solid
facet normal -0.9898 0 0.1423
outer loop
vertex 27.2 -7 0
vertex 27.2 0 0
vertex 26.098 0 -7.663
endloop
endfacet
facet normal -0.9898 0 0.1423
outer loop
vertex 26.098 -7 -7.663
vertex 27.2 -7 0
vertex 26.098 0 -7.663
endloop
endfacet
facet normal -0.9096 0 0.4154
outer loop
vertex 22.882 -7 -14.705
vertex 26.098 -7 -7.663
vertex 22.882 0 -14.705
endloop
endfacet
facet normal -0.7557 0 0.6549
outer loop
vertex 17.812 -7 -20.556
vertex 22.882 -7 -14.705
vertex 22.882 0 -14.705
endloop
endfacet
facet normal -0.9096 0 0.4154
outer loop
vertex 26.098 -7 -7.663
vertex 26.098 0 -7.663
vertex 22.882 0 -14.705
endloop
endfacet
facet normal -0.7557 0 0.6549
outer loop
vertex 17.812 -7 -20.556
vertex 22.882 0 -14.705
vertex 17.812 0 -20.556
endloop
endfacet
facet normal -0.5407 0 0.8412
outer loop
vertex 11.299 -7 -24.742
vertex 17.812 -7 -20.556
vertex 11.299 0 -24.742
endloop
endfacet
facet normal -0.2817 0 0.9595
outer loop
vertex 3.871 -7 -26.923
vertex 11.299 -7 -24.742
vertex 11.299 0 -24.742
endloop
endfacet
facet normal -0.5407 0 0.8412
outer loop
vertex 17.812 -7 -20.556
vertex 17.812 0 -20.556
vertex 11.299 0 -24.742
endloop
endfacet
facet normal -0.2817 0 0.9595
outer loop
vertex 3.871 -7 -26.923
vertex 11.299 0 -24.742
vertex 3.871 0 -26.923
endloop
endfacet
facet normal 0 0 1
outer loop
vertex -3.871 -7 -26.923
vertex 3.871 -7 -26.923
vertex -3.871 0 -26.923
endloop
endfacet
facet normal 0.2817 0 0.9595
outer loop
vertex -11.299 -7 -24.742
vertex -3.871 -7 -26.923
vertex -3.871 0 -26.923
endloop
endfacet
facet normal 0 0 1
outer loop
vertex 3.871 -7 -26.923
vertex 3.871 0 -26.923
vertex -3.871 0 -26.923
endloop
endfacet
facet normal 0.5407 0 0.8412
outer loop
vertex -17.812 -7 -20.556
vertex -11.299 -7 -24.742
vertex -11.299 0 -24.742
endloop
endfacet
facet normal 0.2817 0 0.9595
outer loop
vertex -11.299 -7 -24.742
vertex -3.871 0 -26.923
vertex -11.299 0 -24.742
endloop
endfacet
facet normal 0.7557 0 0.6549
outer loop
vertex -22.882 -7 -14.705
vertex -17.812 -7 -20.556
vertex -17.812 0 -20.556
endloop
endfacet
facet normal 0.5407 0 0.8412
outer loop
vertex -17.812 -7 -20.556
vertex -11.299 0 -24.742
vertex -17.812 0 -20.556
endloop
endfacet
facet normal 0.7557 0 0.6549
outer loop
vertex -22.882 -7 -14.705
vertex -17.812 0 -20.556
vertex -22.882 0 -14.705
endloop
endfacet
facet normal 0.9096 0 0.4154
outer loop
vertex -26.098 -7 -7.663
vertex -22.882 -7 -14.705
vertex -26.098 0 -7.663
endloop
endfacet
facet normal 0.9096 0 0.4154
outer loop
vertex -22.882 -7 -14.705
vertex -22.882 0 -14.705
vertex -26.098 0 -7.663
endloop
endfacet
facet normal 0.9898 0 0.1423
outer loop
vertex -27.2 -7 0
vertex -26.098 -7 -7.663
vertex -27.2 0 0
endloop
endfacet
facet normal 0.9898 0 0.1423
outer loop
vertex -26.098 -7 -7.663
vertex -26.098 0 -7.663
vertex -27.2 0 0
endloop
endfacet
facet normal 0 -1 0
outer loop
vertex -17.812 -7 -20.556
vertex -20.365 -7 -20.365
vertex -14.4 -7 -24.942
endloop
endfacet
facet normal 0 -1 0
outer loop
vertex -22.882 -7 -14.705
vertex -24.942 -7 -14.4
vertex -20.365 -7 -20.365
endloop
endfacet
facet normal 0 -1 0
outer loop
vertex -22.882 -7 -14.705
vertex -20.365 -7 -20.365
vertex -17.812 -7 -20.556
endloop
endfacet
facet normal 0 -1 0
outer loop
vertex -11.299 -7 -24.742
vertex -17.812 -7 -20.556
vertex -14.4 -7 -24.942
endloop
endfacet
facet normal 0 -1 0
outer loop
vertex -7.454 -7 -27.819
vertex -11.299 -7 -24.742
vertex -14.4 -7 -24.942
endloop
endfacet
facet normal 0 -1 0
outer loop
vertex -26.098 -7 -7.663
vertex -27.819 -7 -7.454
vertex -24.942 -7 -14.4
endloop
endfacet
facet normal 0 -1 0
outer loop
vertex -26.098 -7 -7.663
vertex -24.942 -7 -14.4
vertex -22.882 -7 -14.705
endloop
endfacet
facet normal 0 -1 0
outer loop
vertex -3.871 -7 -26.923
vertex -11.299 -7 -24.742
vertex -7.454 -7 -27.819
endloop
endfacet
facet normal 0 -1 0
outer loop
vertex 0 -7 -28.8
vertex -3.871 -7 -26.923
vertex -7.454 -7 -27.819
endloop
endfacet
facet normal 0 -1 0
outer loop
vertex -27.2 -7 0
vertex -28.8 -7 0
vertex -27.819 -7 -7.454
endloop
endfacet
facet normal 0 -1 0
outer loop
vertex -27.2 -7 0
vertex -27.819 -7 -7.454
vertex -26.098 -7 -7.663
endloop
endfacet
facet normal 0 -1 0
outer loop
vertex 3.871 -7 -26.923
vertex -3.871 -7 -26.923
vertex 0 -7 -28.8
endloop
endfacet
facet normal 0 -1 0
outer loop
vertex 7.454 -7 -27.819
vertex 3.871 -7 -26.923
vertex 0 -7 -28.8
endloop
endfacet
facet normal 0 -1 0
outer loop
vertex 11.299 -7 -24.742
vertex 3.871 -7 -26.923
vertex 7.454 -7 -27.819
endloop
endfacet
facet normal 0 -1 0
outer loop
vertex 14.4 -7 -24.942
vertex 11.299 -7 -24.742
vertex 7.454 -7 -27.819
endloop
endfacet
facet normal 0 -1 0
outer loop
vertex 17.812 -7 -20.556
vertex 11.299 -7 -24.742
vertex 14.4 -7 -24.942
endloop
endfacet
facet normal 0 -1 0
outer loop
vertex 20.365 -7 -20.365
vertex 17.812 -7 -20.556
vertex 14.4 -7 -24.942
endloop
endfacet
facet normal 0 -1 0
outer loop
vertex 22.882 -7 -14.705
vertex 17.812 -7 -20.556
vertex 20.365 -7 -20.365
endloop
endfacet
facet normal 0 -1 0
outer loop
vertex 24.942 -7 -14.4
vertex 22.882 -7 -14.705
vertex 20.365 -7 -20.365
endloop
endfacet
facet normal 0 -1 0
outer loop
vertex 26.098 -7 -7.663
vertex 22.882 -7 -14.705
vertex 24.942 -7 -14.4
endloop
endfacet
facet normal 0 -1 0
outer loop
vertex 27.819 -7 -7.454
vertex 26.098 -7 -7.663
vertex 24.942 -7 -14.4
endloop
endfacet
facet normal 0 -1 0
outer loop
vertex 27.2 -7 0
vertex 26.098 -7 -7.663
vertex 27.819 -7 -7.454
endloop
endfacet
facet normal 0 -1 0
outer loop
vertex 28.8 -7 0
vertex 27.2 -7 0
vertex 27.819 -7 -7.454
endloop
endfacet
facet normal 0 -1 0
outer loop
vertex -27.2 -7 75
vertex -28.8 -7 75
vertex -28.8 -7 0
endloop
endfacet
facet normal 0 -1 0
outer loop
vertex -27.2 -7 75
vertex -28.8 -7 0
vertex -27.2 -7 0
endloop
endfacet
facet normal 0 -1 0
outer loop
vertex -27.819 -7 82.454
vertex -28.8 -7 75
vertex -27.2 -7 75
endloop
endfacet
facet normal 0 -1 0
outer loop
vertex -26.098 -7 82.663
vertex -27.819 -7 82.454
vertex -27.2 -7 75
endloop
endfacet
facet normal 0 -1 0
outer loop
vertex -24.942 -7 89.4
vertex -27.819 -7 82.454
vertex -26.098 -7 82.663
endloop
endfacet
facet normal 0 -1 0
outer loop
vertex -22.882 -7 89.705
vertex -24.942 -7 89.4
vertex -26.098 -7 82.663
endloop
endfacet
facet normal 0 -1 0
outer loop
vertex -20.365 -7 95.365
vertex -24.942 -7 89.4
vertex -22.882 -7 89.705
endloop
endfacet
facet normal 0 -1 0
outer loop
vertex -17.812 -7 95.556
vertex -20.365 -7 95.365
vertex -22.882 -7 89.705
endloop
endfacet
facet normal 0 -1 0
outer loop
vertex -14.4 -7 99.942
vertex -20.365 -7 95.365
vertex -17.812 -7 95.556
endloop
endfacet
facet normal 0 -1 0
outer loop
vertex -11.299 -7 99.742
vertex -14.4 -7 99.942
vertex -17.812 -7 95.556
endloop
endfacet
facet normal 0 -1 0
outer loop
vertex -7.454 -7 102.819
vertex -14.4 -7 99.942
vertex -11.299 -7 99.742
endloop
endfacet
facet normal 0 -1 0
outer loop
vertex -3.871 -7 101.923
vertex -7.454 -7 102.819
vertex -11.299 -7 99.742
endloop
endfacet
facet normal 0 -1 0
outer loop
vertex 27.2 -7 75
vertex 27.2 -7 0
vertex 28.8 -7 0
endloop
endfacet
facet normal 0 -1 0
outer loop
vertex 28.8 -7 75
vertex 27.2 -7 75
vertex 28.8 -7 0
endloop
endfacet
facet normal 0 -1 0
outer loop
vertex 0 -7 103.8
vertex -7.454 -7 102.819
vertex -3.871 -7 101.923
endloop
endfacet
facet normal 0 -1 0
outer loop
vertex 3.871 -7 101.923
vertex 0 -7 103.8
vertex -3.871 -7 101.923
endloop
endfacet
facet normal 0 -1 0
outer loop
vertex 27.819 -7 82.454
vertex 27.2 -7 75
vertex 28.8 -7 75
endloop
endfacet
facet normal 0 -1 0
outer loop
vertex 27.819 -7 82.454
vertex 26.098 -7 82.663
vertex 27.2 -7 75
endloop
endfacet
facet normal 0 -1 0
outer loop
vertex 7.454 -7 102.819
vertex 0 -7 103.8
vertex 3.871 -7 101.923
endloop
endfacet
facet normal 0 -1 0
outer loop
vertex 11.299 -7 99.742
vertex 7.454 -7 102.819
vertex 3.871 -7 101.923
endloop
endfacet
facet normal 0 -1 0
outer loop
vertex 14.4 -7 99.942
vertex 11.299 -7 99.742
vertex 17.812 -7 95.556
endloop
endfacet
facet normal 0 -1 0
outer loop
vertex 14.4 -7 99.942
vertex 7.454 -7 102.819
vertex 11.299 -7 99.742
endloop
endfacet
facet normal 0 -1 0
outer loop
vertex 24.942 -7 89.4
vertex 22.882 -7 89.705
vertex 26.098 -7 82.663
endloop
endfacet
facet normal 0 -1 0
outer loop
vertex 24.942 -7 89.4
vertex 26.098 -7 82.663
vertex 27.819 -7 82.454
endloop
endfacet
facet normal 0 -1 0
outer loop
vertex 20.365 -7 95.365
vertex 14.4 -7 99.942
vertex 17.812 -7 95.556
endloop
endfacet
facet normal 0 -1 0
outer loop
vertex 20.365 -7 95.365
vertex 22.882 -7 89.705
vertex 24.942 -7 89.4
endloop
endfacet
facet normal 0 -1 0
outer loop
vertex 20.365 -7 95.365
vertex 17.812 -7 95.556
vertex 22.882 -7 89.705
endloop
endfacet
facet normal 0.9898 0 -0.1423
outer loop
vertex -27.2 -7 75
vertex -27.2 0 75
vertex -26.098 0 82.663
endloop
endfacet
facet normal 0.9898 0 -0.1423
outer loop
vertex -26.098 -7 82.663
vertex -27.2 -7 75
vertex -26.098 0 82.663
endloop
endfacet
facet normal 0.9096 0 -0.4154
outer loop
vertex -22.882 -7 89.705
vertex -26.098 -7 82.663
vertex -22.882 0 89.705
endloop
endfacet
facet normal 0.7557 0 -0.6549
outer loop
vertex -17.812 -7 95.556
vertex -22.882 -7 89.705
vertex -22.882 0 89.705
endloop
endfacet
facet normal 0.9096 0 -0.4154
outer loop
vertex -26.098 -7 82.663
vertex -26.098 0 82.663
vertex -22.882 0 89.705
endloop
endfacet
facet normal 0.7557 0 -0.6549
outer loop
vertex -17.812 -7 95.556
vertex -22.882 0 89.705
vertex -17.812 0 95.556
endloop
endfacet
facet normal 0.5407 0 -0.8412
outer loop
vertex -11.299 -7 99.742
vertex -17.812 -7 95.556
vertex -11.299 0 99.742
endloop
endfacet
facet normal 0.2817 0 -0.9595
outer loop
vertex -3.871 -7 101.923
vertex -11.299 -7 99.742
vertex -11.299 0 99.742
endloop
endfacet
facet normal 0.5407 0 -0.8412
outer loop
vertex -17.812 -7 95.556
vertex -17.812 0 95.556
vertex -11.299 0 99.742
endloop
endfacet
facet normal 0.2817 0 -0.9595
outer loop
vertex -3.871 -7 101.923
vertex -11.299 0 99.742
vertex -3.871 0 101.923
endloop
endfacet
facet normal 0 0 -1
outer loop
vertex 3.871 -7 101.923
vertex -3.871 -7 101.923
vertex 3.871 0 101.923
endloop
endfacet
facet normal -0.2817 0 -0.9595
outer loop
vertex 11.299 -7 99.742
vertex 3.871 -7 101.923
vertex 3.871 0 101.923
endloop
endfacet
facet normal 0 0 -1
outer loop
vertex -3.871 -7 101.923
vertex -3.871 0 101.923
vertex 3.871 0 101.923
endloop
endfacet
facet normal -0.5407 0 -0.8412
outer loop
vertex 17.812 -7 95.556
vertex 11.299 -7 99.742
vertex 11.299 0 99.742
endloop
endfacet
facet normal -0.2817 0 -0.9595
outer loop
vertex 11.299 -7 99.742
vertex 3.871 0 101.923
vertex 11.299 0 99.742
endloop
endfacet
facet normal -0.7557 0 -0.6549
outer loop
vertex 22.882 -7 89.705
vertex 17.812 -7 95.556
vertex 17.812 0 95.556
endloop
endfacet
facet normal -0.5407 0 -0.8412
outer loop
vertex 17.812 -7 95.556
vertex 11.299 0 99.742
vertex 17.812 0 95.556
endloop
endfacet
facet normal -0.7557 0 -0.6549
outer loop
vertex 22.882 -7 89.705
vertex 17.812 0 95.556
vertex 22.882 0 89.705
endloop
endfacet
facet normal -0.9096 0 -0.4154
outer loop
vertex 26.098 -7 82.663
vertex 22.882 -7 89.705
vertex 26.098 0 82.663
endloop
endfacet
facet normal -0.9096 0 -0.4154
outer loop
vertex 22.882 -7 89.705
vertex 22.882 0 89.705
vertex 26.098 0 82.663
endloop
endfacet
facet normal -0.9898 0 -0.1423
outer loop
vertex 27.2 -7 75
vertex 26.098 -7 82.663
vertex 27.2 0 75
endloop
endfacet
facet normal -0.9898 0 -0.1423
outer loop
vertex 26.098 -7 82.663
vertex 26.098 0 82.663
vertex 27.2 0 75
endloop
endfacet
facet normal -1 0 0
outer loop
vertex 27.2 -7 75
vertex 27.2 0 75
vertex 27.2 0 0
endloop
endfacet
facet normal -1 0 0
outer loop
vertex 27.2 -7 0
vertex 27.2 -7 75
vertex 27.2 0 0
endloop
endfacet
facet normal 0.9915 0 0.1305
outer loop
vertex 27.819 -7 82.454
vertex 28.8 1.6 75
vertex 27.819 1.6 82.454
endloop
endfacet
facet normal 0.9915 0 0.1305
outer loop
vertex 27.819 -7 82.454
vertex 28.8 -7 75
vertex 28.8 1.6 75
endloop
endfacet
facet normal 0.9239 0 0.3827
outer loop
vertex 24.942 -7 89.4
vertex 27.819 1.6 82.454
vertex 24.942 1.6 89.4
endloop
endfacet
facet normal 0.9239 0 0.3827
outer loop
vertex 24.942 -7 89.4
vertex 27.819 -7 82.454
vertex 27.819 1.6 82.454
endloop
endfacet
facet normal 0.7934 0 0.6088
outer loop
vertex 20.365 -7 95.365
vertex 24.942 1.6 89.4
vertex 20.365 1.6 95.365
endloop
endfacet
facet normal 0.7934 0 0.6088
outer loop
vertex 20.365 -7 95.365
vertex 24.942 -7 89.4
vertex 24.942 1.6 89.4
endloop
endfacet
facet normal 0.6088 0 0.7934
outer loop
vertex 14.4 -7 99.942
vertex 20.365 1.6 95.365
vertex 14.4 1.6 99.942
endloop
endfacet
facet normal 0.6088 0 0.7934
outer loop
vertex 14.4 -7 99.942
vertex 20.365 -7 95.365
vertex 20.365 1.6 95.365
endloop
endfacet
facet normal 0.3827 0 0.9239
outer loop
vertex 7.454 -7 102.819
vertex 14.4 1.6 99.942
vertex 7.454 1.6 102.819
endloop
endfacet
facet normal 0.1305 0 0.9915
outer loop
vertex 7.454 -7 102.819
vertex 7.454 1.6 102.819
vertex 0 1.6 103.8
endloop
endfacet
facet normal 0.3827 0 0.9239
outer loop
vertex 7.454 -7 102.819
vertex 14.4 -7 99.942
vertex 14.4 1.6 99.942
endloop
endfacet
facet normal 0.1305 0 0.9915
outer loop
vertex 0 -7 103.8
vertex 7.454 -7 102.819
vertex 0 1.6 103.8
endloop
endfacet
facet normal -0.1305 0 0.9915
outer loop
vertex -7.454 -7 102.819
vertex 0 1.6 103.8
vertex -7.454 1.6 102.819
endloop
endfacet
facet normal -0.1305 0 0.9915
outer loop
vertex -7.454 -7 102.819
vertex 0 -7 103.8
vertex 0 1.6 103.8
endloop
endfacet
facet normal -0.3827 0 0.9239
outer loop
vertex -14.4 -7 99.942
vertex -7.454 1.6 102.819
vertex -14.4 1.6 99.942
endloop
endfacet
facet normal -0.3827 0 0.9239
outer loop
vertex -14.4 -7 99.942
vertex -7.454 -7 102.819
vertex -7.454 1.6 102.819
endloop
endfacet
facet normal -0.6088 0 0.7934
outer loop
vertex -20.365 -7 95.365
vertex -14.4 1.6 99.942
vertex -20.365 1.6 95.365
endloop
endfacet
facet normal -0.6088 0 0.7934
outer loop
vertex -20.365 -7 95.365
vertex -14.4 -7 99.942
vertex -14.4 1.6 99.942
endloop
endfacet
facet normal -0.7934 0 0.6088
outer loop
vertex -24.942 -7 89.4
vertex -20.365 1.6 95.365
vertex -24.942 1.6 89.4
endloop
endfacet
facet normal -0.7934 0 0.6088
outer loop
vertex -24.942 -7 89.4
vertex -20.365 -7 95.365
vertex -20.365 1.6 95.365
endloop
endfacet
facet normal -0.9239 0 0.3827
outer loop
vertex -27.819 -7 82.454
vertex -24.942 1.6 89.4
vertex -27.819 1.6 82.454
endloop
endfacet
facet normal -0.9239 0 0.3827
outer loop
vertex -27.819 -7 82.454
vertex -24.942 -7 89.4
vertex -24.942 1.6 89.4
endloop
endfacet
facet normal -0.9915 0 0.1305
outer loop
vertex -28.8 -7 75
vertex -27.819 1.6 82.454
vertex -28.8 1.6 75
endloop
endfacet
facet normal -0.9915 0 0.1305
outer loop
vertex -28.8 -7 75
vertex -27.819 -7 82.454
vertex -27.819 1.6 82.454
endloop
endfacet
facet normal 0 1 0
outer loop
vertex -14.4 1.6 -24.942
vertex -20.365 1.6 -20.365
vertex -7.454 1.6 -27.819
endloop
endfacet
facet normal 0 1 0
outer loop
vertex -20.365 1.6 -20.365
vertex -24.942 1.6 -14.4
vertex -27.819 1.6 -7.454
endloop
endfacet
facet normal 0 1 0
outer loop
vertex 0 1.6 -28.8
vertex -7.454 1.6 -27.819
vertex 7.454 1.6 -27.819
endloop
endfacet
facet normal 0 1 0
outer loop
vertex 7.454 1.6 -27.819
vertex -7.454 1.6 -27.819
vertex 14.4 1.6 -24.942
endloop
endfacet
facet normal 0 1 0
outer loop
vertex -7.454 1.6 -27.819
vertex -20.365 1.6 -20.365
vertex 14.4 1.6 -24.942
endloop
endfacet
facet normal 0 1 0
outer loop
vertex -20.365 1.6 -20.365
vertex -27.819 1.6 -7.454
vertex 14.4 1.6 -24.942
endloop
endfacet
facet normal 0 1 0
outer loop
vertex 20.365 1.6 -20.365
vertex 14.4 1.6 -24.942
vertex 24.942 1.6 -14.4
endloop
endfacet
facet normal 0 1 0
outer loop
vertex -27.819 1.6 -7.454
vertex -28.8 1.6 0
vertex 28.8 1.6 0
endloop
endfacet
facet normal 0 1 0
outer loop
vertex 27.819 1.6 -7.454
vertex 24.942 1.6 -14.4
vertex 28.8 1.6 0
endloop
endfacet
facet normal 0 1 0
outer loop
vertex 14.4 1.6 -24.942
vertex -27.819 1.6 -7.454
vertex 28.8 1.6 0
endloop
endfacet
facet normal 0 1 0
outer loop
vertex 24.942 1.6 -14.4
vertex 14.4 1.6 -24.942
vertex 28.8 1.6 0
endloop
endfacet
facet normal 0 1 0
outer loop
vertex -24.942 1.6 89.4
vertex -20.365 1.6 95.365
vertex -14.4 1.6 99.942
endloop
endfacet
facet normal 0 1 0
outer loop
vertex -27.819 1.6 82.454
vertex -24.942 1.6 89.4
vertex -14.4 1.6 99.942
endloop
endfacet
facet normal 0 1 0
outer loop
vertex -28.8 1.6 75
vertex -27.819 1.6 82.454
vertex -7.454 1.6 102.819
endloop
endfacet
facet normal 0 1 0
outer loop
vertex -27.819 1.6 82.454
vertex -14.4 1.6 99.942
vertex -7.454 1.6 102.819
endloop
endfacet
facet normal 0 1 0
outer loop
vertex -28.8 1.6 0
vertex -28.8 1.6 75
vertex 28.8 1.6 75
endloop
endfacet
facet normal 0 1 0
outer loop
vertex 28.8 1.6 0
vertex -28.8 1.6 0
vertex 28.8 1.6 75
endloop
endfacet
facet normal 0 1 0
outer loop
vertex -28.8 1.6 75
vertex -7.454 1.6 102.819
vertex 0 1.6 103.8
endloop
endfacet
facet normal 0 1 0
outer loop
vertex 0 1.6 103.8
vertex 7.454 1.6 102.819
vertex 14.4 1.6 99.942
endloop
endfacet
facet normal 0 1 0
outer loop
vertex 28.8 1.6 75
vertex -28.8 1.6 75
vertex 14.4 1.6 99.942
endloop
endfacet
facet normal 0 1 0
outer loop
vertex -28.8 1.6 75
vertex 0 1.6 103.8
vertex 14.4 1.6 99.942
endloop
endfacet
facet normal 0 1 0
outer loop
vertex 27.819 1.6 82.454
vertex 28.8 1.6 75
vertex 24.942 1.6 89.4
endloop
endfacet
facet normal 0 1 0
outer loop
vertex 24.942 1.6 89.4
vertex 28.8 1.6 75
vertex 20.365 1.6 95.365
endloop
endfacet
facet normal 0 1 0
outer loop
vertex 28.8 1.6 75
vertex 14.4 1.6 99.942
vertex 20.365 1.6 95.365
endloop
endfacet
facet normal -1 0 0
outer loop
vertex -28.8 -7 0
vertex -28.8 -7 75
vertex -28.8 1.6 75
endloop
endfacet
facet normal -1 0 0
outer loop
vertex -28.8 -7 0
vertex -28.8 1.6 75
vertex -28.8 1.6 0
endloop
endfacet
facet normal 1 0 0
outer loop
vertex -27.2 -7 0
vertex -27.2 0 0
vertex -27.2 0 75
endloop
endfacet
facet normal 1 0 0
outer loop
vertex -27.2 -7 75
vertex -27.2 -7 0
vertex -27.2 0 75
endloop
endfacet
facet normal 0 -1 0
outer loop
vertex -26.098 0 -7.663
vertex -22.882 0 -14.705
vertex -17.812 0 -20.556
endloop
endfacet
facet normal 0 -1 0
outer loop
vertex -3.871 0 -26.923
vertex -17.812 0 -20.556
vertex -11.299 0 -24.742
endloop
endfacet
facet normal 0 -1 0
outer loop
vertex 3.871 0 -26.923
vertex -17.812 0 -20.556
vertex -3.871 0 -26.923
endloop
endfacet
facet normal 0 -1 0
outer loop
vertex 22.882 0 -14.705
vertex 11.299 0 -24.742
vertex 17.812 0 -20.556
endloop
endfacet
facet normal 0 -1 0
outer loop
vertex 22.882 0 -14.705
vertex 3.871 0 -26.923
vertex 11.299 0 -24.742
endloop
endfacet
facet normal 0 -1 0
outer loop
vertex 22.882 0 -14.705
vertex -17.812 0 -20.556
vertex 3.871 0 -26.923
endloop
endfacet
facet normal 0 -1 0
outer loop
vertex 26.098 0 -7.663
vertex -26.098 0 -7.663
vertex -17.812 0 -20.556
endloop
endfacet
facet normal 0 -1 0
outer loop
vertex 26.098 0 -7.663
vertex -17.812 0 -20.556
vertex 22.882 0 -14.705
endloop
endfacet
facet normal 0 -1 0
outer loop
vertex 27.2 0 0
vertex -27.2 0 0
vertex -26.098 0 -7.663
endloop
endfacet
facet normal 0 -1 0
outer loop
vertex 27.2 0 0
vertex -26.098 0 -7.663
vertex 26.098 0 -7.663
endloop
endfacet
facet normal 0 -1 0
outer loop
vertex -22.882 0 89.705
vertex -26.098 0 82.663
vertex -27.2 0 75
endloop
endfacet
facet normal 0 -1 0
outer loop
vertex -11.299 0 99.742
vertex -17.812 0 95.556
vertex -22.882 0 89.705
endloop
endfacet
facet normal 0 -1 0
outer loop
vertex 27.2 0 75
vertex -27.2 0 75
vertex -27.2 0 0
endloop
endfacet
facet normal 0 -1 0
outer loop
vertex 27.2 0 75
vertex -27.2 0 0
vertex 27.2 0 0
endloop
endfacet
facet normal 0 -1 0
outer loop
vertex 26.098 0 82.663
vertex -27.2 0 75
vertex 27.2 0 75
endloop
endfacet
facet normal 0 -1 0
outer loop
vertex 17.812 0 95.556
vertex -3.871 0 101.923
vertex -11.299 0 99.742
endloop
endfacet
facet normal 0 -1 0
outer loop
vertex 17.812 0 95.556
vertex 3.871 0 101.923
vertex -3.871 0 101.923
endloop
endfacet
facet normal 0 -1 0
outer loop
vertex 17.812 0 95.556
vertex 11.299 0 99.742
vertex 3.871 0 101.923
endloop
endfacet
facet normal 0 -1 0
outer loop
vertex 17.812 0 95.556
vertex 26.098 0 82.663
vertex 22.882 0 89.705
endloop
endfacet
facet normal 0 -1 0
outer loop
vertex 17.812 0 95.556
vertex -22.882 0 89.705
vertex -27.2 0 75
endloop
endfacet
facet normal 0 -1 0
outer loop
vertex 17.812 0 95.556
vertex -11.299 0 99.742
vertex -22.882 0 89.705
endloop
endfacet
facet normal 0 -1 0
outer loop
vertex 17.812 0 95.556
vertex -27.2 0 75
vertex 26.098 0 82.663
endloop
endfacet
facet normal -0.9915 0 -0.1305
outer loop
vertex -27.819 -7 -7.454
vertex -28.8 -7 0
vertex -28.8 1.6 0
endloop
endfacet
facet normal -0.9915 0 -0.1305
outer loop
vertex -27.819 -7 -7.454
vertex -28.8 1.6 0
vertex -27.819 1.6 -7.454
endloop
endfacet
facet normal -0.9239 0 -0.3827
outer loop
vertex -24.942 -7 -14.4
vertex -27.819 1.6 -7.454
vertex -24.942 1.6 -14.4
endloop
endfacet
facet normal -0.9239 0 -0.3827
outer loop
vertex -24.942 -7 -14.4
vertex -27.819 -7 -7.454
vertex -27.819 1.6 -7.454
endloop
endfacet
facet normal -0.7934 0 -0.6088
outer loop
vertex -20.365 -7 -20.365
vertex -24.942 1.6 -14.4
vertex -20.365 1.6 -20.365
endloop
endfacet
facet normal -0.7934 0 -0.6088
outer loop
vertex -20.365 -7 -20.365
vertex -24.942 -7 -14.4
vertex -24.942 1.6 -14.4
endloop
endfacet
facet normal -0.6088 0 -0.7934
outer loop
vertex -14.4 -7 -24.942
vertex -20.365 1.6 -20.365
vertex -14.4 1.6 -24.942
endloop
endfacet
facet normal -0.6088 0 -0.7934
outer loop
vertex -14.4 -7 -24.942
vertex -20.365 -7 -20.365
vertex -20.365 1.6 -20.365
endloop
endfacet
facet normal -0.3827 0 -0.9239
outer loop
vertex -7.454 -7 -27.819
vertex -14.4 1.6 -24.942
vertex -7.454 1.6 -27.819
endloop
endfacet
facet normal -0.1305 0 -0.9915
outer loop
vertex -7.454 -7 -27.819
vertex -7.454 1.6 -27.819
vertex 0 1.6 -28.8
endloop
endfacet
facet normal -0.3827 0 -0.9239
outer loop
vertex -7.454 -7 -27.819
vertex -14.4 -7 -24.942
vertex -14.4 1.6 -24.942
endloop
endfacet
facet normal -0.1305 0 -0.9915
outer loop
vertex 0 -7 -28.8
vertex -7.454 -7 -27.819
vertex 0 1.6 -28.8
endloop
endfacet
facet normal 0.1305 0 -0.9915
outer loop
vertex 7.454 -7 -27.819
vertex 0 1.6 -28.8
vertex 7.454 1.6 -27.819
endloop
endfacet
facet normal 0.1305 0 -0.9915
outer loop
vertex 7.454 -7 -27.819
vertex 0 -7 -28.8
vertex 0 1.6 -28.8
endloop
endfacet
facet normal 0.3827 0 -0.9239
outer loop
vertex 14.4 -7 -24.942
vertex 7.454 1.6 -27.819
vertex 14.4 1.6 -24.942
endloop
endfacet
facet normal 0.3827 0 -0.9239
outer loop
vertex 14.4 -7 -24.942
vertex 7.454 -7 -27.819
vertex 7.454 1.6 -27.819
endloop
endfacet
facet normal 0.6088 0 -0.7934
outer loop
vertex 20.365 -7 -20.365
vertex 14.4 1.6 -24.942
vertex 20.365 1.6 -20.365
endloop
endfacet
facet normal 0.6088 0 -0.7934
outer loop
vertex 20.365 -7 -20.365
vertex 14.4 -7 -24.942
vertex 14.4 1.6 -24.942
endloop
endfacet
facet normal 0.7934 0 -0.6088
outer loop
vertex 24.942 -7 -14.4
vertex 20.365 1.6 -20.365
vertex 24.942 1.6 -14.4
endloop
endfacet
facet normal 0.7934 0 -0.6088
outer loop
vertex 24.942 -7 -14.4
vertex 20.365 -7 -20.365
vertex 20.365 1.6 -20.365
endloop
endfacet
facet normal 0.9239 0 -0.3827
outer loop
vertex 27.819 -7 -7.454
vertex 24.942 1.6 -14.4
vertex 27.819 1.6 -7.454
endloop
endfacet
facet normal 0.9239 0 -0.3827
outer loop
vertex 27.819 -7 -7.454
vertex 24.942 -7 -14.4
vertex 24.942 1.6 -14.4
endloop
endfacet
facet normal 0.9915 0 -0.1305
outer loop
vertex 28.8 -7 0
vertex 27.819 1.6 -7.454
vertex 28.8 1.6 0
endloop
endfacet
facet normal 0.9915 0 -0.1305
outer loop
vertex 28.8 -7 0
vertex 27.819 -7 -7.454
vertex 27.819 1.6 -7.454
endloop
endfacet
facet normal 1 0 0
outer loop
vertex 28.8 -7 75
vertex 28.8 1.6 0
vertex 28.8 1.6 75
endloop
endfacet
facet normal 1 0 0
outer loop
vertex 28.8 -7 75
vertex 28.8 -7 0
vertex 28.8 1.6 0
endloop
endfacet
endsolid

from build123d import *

# Parameters (mm, degrees)
F3_DEPTH = 7
F4_DEPTH = 1.6


with BuildPart() as f3:
    # F2 (on Front) → F3 (new body)
    with BuildSketch(Plane.XZ):
        with BuildLine():
            ThreePointArc((28.8, 75), (0, 103.8), (-28.8, 75))
            Line((-28.8, 75), (-28.8, 0))
            ThreePointArc((-28.8, 0), (0, -28.8), (28.8, 0))
            Line((28.8, 0), (28.8, 75))
        make_face()
        with BuildLine():
            Line((27.2, 75), (27.2, 0))
            ThreePointArc((27.2, 0), (0, -27.2), (-27.2, 0))
            Line((-27.2, 0), (-27.2, 75))
            ThreePointArc((-27.2, 75), (0, 102.2), (27.2, 75))
        make_face(mode=Mode.SUBTRACT)
    extrude(amount=F3_DEPTH)

    # F2 (on Front) → F4 (join)
    with BuildSketch(Plane.XZ):
        with BuildLine():
            ThreePointArc((28.8, 75), (0, 103.8), (-28.8, 75))
            Line((-28.8, 75), (-28.8, 0))
            ThreePointArc((-28.8, 0), (0, -28.8), (28.8, 0))
            Line((28.8, 0), (28.8, 75))
        make_face()
        with BuildLine():
            Line((27.2, 75), (27.2, 0))
            ThreePointArc((27.2, 0), (0, -27.2), (-27.2, 0))
            Line((-27.2, 0), (-27.2, 75))
            ThreePointArc((-27.2, 75), (0, 102.2), (27.2, 75))
        make_face(mode=Mode.SUBTRACT)
        with BuildLine():
            ThreePointArc((-27.2, 0), (0, -27.2), (27.2, 0))
            Line((27.2, 0), (27.2, 75))
            ThreePointArc((27.2, 75), (0, 102.2), (-27.2, 75))
            Line((-27.2, 75), (-27.2, 0))
        make_face()
    extrude(amount=-F4_DEPTH)


solid = f3.part
